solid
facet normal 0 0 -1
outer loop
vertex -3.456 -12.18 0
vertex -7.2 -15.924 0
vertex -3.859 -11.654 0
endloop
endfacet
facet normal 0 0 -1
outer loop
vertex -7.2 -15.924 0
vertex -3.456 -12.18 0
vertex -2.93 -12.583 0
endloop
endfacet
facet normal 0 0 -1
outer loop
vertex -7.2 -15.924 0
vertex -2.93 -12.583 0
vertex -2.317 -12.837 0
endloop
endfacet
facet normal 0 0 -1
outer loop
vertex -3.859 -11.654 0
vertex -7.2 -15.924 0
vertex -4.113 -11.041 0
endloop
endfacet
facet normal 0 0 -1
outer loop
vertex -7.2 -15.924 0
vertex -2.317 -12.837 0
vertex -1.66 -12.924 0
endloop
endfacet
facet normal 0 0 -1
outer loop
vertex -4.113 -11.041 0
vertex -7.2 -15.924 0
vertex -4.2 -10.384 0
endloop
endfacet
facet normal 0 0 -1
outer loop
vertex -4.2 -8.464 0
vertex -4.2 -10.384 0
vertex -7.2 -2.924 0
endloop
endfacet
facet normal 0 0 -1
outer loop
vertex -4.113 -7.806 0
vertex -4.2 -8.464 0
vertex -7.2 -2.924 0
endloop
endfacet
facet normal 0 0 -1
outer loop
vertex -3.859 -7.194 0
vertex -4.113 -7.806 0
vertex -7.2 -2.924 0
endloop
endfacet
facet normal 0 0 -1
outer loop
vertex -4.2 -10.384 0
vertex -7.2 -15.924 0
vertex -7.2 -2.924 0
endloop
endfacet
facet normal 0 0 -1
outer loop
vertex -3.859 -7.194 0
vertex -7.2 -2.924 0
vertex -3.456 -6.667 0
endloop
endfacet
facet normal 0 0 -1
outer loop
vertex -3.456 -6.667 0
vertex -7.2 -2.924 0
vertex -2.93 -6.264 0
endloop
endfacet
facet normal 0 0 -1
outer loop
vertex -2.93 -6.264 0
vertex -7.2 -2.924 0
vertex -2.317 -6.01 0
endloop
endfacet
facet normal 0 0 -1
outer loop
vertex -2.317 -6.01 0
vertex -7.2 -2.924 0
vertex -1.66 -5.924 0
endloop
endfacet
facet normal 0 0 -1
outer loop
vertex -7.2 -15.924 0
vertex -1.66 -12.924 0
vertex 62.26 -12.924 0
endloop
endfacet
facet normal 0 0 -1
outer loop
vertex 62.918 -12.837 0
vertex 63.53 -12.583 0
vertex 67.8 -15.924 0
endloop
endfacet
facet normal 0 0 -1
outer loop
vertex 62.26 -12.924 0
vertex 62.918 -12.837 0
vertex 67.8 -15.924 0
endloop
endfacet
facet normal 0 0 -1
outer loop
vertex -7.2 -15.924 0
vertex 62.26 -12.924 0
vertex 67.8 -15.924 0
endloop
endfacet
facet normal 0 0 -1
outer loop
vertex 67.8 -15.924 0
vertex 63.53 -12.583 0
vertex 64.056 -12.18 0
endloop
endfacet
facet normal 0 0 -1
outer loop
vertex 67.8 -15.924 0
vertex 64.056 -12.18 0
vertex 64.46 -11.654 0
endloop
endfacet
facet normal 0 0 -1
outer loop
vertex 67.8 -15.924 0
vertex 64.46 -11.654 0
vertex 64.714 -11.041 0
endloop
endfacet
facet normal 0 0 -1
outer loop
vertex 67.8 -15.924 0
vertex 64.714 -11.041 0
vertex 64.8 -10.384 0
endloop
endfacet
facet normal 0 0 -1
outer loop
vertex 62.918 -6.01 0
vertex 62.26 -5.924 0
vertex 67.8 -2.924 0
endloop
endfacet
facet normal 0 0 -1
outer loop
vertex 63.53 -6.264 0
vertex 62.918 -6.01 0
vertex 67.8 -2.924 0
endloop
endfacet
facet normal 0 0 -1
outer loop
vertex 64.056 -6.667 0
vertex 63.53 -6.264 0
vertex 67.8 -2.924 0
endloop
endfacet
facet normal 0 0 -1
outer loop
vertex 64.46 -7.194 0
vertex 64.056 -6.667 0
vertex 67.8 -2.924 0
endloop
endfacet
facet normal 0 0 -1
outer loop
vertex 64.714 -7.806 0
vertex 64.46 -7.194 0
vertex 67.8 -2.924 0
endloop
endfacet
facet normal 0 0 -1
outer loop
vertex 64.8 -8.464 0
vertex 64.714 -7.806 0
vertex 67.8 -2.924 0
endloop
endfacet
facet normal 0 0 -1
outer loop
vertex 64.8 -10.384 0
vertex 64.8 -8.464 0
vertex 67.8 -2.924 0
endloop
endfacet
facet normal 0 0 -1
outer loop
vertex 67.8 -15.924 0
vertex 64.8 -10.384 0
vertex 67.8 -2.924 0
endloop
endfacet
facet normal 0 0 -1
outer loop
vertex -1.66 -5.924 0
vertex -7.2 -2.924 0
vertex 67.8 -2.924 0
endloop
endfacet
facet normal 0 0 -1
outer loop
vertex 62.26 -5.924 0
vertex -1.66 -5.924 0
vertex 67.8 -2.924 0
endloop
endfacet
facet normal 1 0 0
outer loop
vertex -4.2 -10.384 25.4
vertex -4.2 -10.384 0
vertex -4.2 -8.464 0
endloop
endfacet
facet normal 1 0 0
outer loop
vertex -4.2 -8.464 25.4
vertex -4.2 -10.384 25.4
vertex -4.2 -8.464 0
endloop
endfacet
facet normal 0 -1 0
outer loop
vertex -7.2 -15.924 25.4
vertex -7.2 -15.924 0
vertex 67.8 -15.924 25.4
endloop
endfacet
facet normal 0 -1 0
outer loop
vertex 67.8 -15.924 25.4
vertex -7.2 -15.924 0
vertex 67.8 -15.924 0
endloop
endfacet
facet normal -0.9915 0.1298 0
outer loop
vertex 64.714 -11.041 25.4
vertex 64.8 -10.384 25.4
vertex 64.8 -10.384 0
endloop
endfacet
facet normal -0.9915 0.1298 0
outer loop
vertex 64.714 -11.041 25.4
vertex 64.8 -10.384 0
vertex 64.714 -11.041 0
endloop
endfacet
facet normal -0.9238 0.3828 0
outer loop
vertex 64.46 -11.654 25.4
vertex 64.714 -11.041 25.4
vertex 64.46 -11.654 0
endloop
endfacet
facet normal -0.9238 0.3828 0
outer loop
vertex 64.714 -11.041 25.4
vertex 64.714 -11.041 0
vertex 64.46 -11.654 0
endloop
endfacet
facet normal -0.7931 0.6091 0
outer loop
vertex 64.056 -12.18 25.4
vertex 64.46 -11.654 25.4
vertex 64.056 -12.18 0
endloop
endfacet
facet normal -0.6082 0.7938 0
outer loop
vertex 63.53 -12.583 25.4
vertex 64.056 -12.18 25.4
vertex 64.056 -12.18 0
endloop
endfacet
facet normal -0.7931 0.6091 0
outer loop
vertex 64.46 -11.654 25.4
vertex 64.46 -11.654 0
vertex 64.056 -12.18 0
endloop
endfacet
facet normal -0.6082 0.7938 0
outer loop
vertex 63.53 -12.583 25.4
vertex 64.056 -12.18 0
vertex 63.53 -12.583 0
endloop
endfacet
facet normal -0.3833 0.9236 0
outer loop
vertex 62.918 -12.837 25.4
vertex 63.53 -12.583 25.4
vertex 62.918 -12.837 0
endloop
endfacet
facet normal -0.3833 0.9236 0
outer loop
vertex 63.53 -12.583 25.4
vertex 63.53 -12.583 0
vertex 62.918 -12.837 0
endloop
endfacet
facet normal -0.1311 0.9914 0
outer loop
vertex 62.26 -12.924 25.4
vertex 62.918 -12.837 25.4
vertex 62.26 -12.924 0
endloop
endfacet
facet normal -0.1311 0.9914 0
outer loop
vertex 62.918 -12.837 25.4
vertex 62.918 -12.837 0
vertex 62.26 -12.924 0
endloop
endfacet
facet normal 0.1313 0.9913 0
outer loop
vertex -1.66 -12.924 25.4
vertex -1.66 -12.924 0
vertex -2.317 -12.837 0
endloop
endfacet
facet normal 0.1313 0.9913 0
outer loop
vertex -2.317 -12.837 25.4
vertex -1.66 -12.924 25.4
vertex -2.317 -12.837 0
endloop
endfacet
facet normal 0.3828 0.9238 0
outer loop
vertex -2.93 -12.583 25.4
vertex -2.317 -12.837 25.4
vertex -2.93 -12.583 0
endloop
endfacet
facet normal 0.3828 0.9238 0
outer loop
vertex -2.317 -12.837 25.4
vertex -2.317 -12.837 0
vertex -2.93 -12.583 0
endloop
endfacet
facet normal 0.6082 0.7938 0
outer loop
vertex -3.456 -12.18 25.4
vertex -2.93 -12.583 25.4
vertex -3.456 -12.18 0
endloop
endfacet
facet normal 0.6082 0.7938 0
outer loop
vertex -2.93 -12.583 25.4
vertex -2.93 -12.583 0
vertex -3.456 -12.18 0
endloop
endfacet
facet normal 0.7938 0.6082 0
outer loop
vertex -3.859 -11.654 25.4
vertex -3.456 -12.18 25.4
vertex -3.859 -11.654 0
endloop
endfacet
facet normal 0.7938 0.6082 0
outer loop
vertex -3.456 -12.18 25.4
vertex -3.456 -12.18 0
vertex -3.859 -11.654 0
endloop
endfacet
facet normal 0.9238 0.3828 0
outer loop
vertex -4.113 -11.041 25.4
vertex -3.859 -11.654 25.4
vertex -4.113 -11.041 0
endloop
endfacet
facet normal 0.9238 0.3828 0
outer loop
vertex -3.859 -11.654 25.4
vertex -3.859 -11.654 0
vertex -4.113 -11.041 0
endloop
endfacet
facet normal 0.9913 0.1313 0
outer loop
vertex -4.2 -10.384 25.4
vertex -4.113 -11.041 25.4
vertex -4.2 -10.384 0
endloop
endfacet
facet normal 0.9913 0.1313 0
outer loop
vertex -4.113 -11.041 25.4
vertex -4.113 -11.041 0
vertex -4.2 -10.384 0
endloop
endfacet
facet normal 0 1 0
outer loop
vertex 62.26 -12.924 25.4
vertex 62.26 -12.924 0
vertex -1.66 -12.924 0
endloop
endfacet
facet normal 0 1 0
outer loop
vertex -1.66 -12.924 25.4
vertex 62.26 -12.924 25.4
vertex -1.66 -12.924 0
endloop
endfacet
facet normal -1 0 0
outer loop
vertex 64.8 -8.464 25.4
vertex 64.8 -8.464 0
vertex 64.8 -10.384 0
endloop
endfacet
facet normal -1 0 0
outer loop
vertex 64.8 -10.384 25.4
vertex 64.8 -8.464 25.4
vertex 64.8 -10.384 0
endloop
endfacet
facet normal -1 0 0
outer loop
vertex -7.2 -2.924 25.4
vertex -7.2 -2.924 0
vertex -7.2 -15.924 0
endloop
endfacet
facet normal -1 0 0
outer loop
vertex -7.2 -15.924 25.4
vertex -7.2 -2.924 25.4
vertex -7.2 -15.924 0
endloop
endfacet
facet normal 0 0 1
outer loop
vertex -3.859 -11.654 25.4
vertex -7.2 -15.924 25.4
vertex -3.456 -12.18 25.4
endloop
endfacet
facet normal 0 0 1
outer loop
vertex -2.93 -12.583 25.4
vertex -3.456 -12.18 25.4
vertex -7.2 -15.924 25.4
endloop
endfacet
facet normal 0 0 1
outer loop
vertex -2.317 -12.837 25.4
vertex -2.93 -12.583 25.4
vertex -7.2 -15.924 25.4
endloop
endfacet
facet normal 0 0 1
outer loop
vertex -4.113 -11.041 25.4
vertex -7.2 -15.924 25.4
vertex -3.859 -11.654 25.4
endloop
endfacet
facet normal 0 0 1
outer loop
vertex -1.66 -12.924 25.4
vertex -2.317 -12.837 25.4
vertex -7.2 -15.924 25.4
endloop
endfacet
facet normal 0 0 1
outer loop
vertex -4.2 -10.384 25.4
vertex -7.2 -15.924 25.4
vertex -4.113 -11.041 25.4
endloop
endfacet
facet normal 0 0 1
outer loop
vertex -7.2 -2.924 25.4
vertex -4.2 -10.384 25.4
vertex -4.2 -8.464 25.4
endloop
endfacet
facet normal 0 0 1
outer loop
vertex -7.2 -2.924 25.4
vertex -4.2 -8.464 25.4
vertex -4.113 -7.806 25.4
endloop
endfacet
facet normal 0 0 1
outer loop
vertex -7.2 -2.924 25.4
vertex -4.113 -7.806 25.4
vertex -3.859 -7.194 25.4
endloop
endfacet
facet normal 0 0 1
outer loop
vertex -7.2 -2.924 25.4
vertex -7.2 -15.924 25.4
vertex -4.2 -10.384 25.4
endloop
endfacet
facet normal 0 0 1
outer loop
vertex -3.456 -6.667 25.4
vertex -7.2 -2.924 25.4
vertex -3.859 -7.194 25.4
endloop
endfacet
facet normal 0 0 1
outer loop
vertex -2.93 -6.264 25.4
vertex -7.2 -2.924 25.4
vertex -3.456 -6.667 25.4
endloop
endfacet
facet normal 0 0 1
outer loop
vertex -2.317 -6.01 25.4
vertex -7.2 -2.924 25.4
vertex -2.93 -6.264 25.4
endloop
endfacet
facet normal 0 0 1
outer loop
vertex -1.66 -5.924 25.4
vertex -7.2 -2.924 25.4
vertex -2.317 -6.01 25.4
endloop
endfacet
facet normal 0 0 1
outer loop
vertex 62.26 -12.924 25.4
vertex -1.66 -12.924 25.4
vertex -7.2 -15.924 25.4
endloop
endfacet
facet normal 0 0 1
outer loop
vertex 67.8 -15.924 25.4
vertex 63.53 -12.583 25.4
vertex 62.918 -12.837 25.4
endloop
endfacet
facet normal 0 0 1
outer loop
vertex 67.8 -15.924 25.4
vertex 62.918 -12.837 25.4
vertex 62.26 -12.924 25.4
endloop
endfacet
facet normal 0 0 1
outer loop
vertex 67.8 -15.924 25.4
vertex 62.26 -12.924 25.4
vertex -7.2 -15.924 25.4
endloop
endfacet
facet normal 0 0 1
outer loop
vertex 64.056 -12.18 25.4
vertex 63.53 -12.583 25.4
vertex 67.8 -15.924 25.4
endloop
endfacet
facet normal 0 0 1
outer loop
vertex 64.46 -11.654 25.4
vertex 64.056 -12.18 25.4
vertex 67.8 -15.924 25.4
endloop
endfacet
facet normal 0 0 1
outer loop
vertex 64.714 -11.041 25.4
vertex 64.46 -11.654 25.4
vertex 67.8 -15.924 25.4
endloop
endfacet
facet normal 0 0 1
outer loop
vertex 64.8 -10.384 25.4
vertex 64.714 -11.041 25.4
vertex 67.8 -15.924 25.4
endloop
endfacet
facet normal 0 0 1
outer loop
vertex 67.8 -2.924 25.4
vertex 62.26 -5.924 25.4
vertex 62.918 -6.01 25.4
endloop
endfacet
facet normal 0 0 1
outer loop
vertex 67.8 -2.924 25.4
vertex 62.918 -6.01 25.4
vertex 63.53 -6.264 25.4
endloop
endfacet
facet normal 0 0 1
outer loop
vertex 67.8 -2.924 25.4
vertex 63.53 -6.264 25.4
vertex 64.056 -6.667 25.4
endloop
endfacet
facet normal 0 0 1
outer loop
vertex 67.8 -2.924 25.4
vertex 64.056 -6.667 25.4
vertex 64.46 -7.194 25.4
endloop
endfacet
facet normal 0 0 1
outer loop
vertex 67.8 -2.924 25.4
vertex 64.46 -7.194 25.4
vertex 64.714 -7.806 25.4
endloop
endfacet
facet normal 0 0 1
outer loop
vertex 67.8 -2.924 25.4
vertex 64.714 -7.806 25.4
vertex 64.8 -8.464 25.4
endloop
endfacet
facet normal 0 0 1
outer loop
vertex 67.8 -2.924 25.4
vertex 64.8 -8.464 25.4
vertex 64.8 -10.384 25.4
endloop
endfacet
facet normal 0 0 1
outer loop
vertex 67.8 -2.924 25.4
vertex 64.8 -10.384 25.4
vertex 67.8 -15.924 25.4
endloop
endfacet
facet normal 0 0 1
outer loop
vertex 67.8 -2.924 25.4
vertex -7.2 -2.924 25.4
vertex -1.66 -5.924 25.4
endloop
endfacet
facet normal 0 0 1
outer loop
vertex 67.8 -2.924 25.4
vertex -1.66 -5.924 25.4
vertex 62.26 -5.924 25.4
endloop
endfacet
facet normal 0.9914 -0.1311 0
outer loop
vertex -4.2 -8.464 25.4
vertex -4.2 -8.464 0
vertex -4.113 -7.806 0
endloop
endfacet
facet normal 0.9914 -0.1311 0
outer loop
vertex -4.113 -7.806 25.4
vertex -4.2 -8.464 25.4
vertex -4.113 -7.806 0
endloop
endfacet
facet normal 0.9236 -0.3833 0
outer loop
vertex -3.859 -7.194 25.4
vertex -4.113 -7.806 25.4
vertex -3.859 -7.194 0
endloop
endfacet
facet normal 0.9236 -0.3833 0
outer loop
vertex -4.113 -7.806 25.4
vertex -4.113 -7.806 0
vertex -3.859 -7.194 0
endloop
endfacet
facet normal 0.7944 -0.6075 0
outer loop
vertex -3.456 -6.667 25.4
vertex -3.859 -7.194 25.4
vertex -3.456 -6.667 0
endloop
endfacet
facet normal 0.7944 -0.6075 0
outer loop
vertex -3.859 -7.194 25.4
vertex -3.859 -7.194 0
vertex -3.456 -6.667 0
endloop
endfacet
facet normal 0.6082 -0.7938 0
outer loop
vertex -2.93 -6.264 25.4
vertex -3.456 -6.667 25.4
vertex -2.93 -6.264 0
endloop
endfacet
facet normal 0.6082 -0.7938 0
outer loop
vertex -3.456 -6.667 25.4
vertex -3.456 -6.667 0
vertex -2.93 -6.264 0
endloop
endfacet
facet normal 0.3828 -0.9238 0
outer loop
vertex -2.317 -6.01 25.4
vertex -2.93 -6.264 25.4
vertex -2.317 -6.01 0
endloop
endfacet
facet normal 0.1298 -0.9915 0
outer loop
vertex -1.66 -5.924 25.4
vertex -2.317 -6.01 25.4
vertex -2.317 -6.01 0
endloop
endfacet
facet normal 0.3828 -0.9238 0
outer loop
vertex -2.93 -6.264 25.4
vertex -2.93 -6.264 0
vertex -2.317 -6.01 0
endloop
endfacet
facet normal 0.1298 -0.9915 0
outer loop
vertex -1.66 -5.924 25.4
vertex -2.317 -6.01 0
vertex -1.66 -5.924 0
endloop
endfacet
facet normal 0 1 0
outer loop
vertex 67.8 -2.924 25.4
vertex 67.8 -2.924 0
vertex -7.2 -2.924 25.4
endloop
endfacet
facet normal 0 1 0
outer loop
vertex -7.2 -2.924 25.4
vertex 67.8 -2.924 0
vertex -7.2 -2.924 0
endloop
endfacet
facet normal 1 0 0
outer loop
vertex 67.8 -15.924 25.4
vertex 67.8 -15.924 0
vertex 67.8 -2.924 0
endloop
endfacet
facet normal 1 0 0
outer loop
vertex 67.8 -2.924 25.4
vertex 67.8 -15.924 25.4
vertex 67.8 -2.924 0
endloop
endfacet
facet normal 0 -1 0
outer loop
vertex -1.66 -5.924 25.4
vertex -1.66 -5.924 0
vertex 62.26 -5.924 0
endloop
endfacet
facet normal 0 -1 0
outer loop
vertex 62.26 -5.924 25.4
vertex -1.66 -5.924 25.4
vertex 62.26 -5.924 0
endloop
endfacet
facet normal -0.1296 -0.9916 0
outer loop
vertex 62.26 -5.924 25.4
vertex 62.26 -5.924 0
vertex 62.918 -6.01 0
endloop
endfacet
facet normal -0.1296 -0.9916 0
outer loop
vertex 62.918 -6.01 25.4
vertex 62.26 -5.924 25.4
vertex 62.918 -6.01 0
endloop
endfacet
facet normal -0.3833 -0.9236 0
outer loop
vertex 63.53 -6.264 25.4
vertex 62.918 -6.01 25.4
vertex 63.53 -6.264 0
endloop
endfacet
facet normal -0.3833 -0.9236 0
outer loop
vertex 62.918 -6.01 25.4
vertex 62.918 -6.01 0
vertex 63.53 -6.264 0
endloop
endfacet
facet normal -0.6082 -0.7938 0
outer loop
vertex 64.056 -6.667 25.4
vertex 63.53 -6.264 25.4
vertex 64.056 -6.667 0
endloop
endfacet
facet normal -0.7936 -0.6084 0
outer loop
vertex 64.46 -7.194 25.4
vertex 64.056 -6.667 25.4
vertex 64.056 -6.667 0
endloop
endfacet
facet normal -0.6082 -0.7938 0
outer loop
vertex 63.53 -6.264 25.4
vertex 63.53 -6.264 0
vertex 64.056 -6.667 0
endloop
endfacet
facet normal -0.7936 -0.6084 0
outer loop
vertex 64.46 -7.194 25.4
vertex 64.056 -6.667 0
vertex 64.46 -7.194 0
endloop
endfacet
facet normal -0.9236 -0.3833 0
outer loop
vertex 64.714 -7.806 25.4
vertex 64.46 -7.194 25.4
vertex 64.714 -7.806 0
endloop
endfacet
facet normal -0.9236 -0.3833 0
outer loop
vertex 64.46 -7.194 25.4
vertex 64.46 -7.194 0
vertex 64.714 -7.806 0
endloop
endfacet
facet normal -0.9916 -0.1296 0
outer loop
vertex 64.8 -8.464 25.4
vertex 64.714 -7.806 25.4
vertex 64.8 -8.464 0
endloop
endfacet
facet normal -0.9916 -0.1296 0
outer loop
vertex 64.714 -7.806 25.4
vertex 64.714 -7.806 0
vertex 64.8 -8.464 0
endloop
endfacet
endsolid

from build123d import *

# Parameters (mm, degrees)
F1_DEPTH = 25.4


with BuildPart() as f1:
    # F0 (on Top) → F1 (new body)
    with BuildSketch(Plane.XY):
        Polygon((-7.199717, -15.923513), (-1.659717, -15.923513), (67.800283, -15.923513), (67.800283, -2.923513), (-7.199717, -2.923513), (-7.199717, -12.923513), align=None)
        with BuildLine():
            Line((62.260283, -12.923513), (-1.659717, -12.923513))
            ThreePointArc((-1.659717, -12.923513), (-3.455768, -12.179564), (-4.199717, -10.383513))
            Line((-4.199717, -10.383513), (-4.199717, -8.463513))
            ThreePointArc((-4.199717, -8.463513), (-3.455768, -6.667462), (-1.659717, -5.923513))
            Line((-1.659717, -5.923513), (62.260283, -5.923513))
            ThreePointArc((62.260283, -5.923513), (64.056334, -6.667462), (64.800283, -8.463513))
            Line((64.800283, -8.463513), (64.800283, -10.383513))
            ThreePointArc((64.800283, -10.383513), (64.056334, -12.179564), (62.260283, -12.923513))
        make_face(mode=Mode.SUBTRACT)
    extrude(amount=F1_DEPTH)


solid = f1.part
